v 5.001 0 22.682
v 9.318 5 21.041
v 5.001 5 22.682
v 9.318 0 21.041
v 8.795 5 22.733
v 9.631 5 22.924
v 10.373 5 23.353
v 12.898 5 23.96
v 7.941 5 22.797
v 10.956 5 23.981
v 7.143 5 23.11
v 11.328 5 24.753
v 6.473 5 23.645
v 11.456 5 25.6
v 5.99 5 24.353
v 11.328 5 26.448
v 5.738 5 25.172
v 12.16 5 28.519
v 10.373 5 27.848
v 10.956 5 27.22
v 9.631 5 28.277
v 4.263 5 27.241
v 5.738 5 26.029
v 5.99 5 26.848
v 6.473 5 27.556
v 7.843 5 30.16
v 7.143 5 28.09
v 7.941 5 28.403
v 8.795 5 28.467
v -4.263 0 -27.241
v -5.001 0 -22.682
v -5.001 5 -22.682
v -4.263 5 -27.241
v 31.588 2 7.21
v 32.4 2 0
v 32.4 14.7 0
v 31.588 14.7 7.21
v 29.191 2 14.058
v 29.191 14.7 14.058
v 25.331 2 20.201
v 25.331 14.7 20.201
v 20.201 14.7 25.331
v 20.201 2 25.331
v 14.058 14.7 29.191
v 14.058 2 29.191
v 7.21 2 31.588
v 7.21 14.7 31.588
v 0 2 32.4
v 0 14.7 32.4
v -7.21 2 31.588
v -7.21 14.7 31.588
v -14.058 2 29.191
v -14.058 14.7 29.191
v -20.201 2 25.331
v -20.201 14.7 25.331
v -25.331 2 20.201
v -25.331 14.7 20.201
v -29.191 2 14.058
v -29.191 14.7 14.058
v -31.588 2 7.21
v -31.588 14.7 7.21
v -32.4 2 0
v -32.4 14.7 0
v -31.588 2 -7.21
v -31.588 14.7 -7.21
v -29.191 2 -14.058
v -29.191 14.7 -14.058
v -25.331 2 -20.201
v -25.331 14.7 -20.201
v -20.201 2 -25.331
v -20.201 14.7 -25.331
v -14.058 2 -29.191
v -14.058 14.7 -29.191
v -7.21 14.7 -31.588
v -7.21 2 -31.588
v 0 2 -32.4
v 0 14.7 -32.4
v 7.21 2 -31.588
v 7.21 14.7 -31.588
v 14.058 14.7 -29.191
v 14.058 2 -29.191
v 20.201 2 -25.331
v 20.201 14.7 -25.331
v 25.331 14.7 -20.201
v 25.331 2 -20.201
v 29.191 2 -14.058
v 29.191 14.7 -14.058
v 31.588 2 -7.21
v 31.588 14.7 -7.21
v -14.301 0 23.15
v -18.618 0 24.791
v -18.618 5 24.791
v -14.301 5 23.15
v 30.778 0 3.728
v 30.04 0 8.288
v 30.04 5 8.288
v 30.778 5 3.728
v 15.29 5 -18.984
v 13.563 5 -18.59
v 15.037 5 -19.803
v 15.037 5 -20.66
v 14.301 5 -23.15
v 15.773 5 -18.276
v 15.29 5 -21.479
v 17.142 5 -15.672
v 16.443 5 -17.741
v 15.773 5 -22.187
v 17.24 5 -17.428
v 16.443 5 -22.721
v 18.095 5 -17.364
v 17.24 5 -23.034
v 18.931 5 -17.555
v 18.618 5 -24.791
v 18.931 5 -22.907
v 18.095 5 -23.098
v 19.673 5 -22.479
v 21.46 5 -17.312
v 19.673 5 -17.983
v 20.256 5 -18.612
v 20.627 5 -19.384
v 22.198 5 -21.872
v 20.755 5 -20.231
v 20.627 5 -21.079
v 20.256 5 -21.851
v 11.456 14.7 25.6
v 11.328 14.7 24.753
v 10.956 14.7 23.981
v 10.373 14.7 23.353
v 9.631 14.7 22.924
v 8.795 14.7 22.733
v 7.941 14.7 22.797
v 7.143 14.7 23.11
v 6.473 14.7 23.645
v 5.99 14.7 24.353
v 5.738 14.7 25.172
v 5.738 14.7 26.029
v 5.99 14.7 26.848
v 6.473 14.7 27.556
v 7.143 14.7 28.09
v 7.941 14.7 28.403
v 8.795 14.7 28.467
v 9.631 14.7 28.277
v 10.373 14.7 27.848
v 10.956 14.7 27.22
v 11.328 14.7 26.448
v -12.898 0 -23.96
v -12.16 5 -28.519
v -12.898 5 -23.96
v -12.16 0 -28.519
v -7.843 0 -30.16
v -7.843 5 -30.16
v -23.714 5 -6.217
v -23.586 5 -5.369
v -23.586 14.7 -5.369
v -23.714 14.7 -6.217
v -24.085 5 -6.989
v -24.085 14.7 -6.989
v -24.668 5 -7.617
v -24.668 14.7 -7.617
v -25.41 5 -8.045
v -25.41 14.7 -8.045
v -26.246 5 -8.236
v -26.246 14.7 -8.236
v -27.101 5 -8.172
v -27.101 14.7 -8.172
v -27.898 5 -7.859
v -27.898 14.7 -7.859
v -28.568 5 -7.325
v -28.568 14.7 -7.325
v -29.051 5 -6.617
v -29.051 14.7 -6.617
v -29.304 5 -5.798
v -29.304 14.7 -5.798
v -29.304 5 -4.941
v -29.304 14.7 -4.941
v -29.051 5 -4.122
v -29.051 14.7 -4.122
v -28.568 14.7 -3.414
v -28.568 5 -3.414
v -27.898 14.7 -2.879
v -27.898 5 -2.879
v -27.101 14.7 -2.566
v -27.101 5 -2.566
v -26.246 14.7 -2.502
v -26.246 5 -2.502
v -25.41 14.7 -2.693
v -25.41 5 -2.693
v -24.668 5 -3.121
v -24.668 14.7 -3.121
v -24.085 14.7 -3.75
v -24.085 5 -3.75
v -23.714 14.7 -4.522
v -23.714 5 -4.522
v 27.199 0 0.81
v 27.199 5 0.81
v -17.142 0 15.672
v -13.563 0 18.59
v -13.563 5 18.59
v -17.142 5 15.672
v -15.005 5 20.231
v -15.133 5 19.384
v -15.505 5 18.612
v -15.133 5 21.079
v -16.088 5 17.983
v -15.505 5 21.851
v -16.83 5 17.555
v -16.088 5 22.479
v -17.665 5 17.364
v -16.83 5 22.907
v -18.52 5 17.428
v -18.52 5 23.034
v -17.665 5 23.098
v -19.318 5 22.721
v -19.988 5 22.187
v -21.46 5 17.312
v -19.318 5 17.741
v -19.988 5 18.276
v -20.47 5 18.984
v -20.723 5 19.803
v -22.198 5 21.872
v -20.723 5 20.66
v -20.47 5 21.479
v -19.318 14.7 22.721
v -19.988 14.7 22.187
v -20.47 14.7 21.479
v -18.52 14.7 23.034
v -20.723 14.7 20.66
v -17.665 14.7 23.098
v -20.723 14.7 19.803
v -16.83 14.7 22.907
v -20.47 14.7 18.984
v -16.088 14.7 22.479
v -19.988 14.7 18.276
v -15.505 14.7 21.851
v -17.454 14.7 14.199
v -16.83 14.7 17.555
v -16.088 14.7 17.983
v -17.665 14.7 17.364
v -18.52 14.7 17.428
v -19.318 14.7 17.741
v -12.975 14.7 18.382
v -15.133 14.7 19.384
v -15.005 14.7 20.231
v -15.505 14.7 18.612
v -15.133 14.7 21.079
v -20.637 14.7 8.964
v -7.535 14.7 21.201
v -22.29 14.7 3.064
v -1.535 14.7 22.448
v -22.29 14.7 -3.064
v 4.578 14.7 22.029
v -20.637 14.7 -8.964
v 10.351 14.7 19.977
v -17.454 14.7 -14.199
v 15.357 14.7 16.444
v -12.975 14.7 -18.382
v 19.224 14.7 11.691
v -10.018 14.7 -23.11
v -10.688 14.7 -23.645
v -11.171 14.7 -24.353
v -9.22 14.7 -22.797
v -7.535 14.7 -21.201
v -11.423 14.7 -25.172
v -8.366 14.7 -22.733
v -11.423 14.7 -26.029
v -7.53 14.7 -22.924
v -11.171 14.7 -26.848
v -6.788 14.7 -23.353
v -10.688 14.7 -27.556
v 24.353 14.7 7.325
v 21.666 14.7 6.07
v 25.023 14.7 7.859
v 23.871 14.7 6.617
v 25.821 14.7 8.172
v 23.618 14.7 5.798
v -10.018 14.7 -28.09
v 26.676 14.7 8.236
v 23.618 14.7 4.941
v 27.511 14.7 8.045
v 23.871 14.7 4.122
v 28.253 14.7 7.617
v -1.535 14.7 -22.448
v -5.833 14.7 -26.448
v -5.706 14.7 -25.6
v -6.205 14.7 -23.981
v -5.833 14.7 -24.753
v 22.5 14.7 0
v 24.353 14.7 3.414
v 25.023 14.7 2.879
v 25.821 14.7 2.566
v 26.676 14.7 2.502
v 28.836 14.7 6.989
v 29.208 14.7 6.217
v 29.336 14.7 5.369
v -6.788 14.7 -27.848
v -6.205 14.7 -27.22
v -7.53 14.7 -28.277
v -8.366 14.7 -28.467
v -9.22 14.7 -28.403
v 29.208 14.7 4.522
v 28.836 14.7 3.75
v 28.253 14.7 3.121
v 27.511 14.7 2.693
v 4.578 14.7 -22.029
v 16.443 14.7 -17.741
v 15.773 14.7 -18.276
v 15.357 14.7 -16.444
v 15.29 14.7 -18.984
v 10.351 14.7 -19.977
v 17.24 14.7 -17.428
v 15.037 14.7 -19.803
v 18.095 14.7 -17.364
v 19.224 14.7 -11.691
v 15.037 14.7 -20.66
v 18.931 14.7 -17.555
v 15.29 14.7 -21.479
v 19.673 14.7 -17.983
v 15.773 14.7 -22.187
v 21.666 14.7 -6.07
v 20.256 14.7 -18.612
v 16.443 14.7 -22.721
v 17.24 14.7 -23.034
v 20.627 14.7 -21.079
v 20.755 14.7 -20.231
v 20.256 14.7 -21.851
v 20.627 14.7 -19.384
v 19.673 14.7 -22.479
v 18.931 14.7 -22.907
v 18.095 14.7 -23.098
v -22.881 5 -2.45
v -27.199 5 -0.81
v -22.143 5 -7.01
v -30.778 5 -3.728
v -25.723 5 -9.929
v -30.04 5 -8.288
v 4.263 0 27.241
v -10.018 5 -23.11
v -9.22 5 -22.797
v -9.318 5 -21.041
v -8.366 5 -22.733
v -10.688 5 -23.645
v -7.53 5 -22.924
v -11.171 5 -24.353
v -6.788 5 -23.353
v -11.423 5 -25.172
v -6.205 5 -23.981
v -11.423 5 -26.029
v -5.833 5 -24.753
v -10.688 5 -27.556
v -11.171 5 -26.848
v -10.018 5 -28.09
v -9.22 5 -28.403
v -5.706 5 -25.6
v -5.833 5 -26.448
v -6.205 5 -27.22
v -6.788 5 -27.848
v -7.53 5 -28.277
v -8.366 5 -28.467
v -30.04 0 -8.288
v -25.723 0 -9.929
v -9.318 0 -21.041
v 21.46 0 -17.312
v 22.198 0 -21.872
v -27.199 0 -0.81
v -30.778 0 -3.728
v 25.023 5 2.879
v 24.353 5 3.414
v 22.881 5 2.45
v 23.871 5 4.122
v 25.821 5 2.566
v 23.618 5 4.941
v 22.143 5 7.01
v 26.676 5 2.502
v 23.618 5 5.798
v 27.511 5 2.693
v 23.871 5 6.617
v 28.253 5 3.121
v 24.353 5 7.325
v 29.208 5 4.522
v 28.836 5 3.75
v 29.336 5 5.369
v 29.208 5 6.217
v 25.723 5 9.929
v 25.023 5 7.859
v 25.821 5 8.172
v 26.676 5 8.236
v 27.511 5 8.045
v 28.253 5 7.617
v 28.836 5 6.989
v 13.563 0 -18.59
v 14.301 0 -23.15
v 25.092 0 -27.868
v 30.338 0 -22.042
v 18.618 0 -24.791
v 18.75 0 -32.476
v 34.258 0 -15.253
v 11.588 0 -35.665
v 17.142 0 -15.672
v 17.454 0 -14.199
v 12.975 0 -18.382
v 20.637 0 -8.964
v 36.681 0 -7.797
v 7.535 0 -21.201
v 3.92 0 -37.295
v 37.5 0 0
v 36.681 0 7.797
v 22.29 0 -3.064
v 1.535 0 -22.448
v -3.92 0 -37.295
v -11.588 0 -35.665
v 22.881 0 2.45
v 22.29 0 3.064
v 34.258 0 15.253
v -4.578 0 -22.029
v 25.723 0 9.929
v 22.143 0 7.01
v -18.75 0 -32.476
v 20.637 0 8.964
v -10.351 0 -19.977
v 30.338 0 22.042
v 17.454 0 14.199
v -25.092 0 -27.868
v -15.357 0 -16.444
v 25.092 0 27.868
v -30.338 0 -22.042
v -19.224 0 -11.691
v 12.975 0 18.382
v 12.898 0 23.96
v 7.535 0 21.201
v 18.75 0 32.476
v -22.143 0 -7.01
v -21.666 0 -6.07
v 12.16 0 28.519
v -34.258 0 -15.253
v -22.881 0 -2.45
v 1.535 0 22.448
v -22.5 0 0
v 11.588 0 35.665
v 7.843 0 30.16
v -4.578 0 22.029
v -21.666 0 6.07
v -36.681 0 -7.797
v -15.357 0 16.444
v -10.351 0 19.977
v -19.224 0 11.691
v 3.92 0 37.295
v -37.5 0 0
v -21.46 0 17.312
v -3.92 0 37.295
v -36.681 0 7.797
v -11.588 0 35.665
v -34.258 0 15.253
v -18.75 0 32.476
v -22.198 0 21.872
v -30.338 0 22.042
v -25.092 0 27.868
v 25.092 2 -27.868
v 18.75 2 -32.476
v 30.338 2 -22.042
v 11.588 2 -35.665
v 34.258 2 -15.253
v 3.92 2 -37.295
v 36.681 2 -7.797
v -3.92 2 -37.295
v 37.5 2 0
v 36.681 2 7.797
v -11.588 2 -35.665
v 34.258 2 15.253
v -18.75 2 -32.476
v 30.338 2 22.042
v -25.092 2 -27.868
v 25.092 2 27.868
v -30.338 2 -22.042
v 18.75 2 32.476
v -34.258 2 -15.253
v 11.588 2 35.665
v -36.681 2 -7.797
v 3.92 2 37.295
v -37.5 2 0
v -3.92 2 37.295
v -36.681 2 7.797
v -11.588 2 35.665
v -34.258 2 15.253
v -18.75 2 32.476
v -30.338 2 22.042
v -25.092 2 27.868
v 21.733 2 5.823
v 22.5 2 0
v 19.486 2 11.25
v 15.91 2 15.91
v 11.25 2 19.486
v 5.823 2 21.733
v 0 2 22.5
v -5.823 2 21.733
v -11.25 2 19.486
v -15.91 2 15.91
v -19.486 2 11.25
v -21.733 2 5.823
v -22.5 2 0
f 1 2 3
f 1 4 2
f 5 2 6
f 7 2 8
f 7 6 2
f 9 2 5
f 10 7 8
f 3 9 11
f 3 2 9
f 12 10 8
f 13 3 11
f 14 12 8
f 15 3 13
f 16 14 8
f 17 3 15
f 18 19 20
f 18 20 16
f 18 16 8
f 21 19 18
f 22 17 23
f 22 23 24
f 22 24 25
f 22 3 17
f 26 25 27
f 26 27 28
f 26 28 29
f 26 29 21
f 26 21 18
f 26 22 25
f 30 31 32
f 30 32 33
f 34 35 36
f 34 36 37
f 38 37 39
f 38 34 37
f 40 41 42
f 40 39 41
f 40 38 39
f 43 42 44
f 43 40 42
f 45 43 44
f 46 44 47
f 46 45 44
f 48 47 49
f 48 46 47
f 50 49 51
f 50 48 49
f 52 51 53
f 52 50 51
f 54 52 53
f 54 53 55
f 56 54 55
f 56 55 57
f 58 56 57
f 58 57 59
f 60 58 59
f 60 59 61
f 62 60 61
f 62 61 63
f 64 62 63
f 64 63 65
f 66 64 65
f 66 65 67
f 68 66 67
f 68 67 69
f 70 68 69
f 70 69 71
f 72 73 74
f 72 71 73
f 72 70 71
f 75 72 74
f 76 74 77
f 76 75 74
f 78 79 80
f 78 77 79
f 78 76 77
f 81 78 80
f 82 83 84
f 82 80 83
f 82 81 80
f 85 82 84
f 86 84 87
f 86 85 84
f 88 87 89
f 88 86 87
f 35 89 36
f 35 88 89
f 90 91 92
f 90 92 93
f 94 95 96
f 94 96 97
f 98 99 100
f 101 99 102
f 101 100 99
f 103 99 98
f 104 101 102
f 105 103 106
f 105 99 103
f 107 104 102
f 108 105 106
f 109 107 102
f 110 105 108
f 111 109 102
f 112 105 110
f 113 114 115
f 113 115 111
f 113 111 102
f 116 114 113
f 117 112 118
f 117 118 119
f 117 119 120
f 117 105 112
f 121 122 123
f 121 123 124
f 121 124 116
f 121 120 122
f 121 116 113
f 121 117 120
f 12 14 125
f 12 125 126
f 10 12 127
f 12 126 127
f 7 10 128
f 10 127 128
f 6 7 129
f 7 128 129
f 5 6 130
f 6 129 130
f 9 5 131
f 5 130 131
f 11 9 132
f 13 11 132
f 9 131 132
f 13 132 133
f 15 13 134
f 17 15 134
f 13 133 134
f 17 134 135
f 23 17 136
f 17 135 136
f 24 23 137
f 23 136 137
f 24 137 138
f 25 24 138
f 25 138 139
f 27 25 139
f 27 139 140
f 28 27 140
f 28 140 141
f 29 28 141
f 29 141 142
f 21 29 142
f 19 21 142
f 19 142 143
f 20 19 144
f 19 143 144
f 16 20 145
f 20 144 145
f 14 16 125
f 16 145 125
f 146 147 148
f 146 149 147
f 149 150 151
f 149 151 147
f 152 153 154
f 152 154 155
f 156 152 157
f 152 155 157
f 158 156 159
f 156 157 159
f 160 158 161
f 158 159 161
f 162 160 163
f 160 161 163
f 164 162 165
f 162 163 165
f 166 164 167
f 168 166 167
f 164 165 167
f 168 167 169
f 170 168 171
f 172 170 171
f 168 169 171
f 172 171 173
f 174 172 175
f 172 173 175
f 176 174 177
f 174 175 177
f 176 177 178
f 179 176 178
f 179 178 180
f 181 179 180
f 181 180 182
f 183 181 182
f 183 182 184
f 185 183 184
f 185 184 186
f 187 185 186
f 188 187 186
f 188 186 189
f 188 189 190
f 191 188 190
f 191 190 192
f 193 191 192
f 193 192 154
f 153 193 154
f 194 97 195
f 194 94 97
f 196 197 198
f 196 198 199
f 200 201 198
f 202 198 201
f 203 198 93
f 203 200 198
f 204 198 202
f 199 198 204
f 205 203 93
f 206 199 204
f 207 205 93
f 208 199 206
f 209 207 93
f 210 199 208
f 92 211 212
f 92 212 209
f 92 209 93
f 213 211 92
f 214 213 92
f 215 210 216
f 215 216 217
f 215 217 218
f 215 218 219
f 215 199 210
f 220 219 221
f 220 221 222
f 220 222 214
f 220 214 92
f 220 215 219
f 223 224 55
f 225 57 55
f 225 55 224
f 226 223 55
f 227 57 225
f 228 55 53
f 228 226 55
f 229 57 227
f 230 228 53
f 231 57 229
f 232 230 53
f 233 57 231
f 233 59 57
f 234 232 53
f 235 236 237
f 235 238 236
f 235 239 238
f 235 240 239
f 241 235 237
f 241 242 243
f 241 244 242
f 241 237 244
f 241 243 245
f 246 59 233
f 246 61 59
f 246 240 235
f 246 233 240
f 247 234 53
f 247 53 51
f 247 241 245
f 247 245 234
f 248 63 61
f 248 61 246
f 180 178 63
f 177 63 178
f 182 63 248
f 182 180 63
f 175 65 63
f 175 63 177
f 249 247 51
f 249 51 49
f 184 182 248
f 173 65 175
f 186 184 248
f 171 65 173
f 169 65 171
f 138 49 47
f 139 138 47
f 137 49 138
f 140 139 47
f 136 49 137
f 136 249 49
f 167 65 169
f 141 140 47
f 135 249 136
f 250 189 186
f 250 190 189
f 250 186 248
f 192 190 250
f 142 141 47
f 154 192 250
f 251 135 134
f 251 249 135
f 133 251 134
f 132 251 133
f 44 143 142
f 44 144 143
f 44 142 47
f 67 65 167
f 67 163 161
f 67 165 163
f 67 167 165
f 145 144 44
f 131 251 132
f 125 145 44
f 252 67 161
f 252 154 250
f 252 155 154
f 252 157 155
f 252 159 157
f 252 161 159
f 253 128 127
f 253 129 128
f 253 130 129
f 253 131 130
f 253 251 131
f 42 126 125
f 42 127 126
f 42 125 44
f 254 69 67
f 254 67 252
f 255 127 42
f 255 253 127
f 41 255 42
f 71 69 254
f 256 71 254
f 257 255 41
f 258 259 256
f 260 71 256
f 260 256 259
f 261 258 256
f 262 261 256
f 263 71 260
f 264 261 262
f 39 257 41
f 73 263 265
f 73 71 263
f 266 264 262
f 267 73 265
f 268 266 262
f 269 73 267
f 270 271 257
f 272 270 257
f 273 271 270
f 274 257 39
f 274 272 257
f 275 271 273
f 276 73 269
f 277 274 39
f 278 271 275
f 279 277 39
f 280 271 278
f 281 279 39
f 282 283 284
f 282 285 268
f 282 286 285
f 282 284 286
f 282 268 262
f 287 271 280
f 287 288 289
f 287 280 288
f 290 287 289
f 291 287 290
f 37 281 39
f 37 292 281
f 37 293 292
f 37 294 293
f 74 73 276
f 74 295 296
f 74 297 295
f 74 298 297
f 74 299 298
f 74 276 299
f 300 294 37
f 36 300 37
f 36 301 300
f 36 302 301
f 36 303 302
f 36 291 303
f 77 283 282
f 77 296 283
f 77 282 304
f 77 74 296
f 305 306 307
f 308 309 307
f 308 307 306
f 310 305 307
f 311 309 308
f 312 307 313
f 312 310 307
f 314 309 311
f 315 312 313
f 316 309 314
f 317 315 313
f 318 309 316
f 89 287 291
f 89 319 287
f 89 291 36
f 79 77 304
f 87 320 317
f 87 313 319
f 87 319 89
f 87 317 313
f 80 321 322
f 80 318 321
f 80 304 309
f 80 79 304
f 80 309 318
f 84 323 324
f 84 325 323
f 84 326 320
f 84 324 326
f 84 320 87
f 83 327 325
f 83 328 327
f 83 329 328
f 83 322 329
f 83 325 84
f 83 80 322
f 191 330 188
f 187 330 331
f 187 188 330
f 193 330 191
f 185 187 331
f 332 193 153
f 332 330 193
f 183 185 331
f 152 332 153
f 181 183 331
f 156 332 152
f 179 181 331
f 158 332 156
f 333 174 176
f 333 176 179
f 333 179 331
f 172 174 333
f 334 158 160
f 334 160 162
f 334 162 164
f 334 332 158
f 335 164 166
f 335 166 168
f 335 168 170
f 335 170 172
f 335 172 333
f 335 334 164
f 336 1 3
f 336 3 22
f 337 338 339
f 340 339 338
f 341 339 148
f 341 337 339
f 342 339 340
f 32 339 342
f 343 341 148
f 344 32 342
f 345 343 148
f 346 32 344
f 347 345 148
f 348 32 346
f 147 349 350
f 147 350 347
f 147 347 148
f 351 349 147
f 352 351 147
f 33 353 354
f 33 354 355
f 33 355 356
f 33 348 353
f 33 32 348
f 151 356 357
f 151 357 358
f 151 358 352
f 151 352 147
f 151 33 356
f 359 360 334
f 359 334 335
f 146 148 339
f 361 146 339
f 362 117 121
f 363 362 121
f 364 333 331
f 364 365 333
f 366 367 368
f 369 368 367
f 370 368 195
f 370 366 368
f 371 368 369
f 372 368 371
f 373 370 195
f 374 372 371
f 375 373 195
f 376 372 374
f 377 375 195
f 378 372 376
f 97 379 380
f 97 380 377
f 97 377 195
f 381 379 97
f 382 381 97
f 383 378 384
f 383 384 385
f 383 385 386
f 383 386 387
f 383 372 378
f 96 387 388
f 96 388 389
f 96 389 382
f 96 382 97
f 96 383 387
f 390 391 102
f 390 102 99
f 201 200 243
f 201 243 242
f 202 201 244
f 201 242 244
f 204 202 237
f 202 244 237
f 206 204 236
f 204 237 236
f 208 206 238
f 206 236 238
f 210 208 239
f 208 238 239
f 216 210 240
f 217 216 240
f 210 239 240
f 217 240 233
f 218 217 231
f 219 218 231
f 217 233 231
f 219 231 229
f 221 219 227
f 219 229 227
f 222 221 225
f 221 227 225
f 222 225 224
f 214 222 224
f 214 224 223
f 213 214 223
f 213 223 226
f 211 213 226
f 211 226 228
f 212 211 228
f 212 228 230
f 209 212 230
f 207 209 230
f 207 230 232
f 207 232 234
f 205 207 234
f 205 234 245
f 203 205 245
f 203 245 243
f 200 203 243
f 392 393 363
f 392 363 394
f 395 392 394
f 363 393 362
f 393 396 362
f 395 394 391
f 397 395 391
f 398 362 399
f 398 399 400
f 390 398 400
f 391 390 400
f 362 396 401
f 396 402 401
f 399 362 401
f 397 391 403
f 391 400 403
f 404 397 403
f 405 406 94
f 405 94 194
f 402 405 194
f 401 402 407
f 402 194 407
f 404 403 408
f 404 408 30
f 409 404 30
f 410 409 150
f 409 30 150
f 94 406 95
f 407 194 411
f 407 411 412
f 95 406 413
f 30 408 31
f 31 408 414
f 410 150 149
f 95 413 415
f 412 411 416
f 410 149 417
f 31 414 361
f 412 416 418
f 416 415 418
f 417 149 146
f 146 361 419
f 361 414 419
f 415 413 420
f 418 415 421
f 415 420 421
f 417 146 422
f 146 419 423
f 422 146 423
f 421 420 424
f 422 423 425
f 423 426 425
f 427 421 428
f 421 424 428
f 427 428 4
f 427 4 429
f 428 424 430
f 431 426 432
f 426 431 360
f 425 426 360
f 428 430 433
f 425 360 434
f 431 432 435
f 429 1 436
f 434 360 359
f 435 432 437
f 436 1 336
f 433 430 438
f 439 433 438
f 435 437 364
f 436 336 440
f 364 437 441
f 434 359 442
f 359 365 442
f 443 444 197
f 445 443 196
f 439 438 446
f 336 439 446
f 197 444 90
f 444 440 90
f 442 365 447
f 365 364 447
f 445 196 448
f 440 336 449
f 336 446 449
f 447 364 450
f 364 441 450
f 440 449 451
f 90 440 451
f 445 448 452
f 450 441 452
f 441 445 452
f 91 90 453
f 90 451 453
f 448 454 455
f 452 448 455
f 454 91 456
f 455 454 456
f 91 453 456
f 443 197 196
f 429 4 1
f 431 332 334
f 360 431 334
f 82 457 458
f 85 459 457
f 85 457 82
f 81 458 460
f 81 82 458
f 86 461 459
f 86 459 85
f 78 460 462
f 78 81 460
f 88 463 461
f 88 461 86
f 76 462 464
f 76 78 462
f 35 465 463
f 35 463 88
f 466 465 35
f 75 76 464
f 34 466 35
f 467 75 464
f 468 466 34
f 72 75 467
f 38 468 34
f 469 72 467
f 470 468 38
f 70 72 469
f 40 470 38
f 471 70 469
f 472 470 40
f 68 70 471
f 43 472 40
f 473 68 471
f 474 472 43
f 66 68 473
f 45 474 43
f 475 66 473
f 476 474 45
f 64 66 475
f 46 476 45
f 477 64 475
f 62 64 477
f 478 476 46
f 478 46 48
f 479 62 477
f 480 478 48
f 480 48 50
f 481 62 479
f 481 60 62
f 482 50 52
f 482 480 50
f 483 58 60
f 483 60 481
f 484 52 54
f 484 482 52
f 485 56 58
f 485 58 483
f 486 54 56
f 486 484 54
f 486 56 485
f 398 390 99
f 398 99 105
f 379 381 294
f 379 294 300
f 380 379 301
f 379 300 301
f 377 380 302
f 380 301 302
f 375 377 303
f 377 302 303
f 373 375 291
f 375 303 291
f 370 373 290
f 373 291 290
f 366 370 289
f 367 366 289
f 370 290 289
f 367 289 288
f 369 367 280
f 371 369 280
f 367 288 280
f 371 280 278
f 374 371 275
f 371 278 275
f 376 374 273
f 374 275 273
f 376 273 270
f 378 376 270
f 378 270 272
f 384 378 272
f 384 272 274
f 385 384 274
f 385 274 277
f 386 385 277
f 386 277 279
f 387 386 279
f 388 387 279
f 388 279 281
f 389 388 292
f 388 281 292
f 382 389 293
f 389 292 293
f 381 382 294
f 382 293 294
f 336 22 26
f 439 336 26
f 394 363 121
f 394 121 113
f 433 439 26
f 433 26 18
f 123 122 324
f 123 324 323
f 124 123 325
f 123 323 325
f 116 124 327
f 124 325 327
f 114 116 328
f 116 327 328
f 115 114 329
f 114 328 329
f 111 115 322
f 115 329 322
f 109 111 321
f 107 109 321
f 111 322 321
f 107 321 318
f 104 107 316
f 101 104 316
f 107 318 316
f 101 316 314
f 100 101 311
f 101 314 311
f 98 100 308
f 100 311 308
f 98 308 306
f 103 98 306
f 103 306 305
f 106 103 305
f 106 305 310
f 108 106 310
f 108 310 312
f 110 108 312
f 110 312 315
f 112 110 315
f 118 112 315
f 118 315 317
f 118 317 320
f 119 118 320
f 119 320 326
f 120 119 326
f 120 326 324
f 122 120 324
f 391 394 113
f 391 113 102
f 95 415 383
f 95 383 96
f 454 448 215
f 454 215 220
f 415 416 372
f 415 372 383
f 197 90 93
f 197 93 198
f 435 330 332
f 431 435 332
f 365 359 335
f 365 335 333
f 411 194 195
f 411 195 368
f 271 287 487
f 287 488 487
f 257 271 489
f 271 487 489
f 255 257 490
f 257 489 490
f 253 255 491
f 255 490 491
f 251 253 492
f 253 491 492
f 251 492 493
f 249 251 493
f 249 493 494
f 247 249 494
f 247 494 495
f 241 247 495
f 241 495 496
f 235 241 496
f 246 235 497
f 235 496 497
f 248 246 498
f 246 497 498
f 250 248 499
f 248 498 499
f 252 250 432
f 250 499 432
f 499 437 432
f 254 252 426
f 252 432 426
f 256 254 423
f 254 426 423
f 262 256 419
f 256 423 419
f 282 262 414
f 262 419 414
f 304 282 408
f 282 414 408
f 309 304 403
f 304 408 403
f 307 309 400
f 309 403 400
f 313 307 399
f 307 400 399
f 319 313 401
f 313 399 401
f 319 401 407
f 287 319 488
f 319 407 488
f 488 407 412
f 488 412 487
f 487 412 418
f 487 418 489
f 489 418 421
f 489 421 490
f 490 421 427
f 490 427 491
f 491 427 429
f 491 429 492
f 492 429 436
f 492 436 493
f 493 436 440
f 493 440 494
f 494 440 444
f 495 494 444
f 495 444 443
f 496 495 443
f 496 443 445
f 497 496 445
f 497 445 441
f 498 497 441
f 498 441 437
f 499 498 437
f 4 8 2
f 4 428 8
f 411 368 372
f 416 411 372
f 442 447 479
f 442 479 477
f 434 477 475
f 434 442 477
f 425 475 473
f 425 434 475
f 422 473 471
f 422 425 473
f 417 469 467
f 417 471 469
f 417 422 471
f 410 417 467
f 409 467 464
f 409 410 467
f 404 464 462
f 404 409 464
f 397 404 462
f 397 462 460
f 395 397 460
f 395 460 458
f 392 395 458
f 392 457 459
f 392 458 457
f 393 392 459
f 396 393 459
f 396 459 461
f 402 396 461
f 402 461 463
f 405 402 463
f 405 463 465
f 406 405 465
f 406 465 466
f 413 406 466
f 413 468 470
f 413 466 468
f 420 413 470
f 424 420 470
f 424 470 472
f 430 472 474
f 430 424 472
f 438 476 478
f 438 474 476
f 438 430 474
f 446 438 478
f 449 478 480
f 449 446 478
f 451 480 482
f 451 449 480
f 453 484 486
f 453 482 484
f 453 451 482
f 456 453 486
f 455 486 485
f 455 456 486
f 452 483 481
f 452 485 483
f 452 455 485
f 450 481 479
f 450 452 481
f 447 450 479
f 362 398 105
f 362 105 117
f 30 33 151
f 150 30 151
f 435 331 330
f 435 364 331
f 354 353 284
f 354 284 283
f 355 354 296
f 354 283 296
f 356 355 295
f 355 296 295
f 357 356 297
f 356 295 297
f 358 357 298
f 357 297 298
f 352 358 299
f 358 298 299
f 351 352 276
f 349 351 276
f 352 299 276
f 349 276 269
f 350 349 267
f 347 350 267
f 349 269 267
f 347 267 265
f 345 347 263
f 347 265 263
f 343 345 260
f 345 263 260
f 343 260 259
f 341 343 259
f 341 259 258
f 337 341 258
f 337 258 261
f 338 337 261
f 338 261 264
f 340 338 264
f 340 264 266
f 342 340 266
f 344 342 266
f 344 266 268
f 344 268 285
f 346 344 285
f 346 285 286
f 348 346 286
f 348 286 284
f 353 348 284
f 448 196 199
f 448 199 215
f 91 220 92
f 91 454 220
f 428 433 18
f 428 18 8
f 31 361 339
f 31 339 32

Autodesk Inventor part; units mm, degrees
ref_plane "YZ Plane" through (0, 0, 0) normal (1, 0, 0) x (0, 1, 0)
ref_plane "XZ Plane" through (0, 0, 0) normal (0, 1, 0) x (-1, 0, 0)
ref_plane "XY Plane" through (0, 0, 0) normal (0, 0, 1) x (1, 0, 0)
sketch "Sketch1" plane through (0, 0, 0) normal (0, 1, 0) x (-1, 0, 0)
  circle A0 centre (0, 0) radius 22.5
  circle A1 centre (0, 0) radius 37.5
  dimension "d0" = 45
  dimension "d1" = 75
extrude "Extrusion1" add sketch "Sketch1" along normal blind 2
sketch "Sketch2" plane through (0, 2, 0) normal (0, 1, 0) x (1, 0, 0)
  circle A0 centre (0, 0) radius 37.5 projected
  circle A1 centre (0, 0) radius 22.5 projected
  circle A2 centre (0, 0) radius 32.4
  dimension "d4" = 64.8
extrude "Extrusion2" add sketch "Sketch2" along normal blind 12.7 contours A2
feature "FaceDraft1" [suppressed]
sketch "Sketch3" plane through (0, 14.7, 0) normal (0, 1, 0) x (1, 0, 0)
  circle A0 centre (26.4608, -5.3692) radius 2.875 projected
  circle A1 centre (17.8802, 20.2311) radius 2.875 projected
  circle A2 centre (-8.5805, 25.6003) radius 2.875 projected
  circle A3 centre (-26.4608, 5.3692) radius 2.875 projected
  circle A4 centre (-17.8802, -20.2311) radius 2.875 projected
  circle A5 centre (8.5805, -25.6003) radius 2.875 projected
  point P0 (0, 0)
extrude "Extrusion3" cut sketch "Sketch3" against normal through all
sketch "Sketch4" plane through (0, 0, 0) normal (0, -1, 0) x (1, 0, 0)
  circle A0 centre (26.4608, 5.3692) radius 2.875 projected
  line L0 (30.7783, 3.7285) -> (27.1986, 0.8097)
  line L1 (27.1986, 0.8097) -> (22.8811, 2.4504)
  line L2 (22.8811, 2.4504) -> (22.1432, 7.0099)
  line L3 (22.1432, 7.0099) -> (25.7229, 9.9287)
  line L4 (25.7229, 9.9287) -> (30.0404, 8.2879)
  line L5 (30.0404, 8.2879) -> (30.7783, 3.7285)
  point P0 (0, 0)
  dimension "d10" = 8
extrude "Extrusion4" cut sketch "Sketch4" against normal blind 5 contours A0 | L0 L1 L2 L3 L4 L5
pattern_circular "Circular Pattern1" count 6 over 360 about axis through (0, 2, 0) along (0, 1, 0) of "Extrusion4"
properties part number "j1Flange"
